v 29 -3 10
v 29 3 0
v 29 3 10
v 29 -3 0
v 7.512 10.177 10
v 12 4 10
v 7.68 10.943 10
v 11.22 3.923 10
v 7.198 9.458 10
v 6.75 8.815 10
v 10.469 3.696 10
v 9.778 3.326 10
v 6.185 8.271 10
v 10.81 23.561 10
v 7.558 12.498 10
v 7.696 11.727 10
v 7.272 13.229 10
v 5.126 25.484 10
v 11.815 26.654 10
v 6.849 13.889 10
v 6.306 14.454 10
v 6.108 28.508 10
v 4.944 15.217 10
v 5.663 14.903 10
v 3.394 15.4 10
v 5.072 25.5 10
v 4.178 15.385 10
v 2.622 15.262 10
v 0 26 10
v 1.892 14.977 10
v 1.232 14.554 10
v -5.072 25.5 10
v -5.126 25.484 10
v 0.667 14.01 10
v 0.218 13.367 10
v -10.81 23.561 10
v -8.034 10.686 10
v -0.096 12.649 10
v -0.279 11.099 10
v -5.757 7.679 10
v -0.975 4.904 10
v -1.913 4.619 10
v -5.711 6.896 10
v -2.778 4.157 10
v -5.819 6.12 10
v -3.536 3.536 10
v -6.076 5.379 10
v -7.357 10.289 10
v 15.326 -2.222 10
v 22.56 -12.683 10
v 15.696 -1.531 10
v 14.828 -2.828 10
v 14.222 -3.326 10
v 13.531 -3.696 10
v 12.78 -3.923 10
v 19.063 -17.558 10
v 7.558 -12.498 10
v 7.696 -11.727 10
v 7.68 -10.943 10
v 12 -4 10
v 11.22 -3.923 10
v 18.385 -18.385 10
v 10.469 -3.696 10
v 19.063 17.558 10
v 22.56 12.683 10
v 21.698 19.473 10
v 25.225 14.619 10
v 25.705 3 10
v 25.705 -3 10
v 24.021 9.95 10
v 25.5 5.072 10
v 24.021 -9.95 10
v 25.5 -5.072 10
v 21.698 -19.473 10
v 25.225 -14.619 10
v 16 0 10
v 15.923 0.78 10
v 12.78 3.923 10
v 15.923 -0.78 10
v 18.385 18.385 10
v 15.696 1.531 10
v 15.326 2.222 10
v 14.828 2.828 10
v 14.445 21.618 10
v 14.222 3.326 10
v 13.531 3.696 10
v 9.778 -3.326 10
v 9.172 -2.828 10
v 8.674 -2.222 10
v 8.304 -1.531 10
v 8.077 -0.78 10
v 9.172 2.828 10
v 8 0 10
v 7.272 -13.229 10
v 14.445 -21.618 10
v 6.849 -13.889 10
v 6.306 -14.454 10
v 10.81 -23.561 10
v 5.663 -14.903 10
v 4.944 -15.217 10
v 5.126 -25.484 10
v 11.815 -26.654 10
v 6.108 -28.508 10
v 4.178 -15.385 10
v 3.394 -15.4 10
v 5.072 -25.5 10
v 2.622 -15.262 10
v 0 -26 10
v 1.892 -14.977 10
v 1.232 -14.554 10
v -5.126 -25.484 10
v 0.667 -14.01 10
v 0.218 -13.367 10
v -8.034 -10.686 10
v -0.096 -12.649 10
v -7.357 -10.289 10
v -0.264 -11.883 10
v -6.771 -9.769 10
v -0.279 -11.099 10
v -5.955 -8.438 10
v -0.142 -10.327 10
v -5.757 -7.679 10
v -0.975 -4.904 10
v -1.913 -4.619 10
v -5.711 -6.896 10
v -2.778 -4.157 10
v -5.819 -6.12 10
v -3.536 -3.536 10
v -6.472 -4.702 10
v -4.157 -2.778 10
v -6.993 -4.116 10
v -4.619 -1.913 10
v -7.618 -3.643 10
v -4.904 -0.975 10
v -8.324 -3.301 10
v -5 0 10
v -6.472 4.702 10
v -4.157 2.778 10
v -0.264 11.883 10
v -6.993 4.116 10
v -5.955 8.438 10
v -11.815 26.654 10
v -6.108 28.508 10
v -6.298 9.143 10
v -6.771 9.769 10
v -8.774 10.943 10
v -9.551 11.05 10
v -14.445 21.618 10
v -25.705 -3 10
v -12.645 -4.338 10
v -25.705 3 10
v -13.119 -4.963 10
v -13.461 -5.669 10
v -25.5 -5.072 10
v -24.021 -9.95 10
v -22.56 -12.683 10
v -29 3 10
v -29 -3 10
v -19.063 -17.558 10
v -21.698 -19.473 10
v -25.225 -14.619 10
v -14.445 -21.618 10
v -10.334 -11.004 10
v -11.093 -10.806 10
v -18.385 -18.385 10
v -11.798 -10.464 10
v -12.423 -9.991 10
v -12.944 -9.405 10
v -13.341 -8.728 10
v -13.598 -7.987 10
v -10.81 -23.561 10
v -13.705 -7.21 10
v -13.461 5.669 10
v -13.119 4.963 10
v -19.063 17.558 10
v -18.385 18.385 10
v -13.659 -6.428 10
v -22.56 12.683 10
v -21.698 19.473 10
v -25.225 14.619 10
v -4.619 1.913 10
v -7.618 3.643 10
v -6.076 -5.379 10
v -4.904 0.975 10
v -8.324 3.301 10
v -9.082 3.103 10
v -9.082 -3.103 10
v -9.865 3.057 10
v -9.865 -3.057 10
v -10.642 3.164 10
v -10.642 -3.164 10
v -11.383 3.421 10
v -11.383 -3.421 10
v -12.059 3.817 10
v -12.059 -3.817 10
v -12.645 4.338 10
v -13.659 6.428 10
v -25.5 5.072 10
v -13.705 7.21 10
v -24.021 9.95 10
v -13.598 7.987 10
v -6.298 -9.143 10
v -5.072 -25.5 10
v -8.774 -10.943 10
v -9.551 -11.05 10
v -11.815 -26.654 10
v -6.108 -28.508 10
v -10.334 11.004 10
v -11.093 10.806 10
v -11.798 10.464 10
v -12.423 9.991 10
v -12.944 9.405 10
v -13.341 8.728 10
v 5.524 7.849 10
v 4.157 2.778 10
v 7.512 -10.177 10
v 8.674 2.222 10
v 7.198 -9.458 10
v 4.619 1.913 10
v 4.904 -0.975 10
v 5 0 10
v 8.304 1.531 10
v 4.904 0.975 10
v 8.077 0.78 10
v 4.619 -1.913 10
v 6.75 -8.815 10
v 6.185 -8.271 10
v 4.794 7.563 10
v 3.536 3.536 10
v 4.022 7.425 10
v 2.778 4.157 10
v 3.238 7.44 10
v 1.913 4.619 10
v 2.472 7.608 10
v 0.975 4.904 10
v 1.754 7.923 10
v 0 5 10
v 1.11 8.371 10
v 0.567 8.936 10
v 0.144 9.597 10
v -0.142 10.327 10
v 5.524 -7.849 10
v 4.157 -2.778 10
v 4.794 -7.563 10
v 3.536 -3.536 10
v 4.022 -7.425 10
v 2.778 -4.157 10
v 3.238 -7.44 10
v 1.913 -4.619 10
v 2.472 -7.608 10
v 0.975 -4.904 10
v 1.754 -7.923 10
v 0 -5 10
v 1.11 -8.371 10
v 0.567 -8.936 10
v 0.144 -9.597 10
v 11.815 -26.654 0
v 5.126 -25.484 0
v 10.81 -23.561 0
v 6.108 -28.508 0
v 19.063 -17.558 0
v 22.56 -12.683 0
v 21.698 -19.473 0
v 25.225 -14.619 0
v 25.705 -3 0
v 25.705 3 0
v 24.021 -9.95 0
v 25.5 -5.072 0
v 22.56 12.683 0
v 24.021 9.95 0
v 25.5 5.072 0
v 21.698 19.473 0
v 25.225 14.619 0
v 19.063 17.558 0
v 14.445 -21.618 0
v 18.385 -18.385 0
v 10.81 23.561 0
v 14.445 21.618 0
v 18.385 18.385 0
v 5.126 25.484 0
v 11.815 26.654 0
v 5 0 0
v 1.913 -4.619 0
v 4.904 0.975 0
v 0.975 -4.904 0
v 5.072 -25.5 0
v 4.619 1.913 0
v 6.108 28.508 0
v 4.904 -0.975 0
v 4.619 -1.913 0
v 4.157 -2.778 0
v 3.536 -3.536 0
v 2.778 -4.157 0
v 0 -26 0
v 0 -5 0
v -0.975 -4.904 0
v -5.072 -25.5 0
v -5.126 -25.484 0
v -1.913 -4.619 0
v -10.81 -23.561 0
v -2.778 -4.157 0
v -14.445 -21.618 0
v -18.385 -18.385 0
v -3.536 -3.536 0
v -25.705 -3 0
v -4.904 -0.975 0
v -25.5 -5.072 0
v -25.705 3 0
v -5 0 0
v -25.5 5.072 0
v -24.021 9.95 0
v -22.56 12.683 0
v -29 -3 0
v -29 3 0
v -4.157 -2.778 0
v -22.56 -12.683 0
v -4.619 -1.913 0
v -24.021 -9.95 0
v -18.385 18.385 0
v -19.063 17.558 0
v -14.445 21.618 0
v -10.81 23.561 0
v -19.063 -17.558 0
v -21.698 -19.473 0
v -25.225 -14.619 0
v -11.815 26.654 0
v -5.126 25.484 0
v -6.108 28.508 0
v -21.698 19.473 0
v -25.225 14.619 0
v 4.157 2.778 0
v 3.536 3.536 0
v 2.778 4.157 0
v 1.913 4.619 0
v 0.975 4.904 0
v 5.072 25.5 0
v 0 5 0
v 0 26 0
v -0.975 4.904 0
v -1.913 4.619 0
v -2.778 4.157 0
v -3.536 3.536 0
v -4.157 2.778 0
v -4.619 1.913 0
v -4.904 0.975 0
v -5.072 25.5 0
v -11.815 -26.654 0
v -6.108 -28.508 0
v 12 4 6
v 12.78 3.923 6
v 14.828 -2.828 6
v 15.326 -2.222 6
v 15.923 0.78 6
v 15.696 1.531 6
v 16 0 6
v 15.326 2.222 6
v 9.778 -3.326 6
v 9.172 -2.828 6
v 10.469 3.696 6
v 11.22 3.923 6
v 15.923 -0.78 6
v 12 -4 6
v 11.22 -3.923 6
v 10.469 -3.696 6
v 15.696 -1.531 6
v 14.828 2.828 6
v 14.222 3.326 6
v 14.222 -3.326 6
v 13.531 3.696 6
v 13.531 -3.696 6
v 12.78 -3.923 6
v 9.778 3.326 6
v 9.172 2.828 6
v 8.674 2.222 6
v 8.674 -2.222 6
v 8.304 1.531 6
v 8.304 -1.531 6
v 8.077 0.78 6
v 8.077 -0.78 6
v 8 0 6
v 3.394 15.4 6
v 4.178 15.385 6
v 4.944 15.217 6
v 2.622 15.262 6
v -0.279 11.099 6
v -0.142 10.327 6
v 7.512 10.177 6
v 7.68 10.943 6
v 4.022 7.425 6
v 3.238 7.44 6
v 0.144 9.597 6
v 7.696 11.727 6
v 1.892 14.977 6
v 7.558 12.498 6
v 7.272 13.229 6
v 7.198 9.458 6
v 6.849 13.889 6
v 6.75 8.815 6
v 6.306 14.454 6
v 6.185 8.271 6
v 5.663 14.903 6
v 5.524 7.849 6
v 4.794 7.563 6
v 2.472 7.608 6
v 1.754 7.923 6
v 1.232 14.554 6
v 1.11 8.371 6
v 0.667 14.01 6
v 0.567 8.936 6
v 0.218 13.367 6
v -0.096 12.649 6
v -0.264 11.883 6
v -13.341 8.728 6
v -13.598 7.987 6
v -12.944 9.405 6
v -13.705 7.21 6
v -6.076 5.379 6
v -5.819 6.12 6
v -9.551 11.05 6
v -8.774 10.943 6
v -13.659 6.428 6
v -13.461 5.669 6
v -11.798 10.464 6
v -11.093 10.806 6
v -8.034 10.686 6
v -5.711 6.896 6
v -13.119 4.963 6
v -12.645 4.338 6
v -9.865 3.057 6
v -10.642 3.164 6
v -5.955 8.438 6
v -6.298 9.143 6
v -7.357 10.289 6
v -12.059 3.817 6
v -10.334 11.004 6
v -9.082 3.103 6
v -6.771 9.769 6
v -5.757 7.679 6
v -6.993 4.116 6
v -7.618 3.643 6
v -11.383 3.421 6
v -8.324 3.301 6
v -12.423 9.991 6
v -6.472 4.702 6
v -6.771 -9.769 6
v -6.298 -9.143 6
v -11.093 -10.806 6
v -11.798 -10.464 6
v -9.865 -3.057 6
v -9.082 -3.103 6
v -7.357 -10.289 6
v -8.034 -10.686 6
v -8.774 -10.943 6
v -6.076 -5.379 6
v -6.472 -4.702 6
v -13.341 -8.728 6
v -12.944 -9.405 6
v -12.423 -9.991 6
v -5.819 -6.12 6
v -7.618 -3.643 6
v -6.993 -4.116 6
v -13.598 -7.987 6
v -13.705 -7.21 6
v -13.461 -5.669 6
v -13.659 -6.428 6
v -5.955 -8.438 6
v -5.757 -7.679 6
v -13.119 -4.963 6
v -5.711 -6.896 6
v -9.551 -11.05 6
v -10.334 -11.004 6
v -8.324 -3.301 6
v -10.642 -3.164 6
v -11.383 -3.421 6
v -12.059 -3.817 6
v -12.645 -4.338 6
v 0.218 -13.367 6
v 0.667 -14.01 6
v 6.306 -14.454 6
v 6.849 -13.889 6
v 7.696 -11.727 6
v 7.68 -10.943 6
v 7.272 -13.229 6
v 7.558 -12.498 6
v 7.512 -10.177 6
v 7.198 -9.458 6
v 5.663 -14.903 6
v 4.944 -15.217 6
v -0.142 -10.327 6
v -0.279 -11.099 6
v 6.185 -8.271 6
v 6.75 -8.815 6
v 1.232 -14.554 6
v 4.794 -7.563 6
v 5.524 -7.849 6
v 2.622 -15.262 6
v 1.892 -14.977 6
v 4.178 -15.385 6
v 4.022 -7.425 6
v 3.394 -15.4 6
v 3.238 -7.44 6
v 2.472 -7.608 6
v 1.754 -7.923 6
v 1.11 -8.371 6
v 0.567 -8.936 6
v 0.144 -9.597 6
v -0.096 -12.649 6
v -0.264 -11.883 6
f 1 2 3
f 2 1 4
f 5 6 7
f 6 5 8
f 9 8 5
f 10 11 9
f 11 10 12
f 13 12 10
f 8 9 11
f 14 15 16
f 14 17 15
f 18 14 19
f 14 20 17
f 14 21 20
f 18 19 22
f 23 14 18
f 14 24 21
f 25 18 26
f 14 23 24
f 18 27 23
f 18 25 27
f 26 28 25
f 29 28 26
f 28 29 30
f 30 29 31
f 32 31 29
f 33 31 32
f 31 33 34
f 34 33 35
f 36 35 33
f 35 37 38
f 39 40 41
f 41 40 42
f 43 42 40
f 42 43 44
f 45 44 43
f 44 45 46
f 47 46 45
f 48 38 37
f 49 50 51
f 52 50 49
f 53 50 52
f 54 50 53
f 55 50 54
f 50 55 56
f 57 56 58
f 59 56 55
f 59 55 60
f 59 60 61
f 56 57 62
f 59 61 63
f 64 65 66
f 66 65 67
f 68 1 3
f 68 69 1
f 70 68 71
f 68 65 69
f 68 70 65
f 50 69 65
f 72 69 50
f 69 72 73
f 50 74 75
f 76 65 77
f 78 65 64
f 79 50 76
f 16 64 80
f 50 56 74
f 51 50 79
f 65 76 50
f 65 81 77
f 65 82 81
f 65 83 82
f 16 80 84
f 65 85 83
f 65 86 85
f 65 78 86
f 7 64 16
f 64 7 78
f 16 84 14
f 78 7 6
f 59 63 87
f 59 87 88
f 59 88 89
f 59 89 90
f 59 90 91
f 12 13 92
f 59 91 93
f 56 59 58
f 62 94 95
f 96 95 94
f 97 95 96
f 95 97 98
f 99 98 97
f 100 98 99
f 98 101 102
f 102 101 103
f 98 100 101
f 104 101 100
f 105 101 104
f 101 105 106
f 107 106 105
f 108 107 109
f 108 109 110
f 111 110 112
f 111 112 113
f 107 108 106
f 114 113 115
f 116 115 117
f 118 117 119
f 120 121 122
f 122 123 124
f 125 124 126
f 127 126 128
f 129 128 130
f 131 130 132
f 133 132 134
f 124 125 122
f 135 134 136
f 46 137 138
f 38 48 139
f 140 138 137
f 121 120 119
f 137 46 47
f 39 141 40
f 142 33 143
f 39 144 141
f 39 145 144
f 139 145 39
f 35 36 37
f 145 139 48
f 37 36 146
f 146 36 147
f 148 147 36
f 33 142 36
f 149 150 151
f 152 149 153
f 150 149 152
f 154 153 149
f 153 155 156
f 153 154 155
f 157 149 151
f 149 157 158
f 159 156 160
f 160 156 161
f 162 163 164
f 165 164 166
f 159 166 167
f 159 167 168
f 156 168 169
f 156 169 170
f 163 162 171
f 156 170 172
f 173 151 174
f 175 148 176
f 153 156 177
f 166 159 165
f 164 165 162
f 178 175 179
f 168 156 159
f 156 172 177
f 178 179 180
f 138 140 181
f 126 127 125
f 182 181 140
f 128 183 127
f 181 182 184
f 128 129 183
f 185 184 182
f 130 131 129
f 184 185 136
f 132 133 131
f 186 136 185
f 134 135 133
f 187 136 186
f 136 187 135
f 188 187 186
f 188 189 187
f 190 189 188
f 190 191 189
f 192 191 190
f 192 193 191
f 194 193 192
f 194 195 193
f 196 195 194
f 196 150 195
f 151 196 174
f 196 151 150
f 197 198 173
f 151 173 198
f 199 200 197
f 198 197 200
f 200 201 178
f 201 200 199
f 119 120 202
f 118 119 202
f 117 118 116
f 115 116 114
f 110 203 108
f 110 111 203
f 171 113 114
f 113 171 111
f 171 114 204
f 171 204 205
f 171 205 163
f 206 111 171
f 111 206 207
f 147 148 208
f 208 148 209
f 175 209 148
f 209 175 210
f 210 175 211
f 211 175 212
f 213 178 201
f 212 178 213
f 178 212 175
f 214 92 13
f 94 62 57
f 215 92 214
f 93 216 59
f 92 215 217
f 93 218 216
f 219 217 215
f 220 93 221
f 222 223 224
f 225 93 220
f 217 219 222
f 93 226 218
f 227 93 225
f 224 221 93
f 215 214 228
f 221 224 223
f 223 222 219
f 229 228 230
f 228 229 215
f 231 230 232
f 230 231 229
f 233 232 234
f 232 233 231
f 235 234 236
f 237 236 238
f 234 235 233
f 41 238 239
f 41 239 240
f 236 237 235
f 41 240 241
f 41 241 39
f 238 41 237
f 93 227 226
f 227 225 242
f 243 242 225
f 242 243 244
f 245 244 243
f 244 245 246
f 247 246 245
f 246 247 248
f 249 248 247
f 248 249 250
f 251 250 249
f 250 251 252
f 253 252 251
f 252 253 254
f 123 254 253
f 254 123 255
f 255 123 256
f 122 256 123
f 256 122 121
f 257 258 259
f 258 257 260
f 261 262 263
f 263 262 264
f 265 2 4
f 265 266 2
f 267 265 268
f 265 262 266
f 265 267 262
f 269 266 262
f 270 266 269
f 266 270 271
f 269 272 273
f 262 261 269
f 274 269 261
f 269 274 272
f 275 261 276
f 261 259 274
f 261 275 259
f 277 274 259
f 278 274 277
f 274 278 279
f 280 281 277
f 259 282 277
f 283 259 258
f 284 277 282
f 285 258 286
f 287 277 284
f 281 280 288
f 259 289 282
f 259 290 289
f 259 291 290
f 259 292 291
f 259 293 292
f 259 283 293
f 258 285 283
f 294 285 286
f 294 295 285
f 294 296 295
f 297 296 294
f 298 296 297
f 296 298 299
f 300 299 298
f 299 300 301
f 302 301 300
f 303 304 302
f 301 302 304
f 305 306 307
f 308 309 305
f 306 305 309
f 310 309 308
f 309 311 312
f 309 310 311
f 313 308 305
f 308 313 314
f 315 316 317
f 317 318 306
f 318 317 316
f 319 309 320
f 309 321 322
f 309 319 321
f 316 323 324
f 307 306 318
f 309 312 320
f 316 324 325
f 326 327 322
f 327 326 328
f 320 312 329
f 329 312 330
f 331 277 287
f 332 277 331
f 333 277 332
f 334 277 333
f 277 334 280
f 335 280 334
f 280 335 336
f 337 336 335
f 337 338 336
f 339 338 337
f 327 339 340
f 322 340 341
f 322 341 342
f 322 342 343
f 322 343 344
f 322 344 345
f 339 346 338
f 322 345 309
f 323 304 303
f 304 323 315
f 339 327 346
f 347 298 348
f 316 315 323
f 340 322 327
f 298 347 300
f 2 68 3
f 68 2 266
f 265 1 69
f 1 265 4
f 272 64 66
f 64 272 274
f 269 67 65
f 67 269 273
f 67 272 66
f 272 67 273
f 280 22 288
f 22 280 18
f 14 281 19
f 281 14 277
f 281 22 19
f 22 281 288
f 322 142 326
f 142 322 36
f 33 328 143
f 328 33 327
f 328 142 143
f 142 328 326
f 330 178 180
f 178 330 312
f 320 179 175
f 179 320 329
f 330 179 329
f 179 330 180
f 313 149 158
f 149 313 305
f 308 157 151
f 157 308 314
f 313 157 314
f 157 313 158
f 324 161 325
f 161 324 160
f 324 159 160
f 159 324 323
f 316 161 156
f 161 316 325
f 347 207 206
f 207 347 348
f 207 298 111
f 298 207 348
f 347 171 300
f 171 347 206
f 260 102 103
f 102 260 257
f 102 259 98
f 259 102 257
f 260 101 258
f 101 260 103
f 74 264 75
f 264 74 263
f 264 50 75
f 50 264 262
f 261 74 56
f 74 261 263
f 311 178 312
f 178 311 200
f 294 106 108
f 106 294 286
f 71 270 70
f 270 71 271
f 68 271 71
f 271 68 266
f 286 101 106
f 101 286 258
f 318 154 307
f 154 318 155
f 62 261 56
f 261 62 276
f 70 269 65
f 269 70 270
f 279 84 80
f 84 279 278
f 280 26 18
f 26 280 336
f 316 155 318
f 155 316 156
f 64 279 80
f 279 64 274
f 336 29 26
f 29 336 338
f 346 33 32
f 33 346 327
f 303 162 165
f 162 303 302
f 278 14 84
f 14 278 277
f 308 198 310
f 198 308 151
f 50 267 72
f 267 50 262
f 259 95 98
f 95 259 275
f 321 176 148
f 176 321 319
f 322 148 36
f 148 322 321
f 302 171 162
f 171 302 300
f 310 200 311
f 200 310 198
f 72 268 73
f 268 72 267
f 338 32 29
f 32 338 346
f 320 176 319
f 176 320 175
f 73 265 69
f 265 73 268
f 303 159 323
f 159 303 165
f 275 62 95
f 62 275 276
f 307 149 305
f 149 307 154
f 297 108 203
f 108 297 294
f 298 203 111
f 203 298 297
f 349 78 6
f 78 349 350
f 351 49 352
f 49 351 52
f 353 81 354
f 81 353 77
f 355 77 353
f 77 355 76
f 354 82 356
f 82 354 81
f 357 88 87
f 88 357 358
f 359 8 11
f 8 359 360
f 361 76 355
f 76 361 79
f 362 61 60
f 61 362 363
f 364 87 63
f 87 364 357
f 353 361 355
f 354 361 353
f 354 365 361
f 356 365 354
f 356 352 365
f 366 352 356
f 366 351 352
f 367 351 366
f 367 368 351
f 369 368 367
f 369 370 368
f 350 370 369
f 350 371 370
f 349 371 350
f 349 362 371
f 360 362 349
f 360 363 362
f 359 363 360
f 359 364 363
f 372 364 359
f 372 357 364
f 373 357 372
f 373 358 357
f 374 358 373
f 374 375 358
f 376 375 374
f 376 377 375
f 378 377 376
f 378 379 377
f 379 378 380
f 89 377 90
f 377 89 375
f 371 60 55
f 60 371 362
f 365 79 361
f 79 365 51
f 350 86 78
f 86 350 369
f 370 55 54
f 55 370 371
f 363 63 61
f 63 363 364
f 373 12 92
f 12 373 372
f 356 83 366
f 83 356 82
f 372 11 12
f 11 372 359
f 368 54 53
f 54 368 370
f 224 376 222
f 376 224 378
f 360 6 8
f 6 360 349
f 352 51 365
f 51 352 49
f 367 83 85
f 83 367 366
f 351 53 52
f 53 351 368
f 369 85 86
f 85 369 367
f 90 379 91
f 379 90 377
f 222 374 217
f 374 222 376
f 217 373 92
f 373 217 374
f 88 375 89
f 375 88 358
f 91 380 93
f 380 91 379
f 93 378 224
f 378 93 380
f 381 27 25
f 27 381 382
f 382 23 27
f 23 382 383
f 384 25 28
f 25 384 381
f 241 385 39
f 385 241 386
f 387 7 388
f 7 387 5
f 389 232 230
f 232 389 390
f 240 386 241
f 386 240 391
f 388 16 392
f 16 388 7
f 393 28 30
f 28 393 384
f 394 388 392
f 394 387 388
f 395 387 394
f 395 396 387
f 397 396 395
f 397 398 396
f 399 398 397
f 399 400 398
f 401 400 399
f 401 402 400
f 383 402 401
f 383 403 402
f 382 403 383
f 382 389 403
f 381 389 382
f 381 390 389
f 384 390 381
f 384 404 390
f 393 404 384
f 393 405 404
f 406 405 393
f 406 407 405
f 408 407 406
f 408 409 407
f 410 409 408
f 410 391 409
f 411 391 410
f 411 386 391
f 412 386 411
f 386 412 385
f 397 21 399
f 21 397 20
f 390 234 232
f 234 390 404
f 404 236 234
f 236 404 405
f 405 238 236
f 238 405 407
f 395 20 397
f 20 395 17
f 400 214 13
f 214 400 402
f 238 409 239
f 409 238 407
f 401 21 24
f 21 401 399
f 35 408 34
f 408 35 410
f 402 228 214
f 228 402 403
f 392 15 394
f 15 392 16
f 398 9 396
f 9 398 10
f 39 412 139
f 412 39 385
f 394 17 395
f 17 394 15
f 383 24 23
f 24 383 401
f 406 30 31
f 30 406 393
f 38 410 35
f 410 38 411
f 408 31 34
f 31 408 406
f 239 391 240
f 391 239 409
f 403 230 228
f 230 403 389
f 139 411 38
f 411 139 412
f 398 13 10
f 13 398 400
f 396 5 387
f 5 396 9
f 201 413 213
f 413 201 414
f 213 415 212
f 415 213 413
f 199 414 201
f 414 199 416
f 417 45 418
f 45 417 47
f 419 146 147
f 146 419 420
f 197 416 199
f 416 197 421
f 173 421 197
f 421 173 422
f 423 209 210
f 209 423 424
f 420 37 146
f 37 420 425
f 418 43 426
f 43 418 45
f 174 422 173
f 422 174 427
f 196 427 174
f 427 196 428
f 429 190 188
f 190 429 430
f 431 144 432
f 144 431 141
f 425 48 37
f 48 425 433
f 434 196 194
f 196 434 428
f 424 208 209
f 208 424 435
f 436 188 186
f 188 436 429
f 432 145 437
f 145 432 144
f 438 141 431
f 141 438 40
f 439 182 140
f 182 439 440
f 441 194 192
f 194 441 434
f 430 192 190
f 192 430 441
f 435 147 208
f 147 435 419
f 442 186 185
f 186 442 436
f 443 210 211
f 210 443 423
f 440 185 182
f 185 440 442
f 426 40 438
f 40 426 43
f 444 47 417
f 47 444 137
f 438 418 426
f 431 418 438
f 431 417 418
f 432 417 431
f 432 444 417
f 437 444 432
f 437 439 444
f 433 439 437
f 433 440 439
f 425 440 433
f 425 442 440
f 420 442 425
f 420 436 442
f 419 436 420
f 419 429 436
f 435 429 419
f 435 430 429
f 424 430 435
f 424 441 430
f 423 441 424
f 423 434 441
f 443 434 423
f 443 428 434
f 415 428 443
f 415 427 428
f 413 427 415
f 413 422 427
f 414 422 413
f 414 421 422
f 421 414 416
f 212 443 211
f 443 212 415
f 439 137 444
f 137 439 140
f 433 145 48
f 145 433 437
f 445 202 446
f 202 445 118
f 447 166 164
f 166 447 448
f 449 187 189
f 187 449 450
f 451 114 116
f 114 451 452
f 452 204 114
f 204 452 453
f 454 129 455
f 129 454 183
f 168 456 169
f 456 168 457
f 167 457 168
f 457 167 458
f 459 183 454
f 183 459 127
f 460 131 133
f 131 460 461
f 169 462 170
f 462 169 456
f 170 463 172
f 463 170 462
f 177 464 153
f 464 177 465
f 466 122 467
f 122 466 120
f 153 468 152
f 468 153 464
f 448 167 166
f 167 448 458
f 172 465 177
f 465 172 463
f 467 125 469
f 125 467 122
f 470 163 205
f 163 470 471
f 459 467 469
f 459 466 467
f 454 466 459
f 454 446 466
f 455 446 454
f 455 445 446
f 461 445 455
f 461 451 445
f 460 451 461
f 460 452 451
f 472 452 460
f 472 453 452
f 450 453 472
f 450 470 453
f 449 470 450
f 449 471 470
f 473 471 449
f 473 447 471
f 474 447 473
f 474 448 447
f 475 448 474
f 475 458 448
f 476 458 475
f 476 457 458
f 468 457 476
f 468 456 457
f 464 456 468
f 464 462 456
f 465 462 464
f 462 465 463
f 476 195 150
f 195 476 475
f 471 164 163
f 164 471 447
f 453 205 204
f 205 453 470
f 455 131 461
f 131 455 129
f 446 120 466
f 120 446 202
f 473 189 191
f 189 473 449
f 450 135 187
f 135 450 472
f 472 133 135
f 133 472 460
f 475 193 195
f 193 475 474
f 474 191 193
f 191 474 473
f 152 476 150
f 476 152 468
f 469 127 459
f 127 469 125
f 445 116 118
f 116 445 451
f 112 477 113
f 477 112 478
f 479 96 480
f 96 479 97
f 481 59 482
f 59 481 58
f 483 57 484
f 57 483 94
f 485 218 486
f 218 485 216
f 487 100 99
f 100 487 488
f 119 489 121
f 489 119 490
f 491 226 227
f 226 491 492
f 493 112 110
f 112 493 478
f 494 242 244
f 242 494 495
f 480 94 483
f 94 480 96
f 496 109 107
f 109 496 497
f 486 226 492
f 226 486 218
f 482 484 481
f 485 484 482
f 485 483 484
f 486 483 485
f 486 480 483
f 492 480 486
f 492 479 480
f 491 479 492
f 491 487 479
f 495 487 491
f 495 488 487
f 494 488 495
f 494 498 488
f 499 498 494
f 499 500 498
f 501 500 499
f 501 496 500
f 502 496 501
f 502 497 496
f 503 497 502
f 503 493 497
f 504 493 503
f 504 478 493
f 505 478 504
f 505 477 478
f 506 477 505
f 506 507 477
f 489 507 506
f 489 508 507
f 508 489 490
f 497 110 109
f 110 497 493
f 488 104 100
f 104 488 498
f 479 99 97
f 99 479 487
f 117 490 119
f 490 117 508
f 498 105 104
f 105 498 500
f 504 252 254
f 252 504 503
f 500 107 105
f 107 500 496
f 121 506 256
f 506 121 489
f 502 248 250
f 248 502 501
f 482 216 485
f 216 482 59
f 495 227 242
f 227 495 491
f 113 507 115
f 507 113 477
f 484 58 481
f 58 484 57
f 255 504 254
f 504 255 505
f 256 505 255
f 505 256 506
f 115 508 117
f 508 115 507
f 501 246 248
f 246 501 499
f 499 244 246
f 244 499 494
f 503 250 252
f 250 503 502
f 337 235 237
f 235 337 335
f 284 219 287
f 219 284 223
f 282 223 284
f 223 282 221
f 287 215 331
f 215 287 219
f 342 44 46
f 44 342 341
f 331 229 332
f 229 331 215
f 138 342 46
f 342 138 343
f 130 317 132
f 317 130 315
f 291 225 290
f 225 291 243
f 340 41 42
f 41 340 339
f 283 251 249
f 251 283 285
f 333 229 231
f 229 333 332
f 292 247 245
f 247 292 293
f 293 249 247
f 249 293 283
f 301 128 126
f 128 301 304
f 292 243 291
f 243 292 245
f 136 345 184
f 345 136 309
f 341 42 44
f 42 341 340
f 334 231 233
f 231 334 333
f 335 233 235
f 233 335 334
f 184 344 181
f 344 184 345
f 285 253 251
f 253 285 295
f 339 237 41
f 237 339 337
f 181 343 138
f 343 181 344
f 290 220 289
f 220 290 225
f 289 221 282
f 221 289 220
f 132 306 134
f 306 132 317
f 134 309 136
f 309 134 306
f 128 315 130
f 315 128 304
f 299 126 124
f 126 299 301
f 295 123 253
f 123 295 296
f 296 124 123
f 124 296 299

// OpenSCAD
$fn = 32;

// ----------------------------------------------------------------------
// Spur blank: lightened gear blank
// ----------------------------------------------------------------------

// --- parameters (mm) ---
disc_r = 26;              // blank root radius
disc_t = 10;              // blank thickness
n_teeth = 10;             // stub tooth count
tooth_w = 6;              // tooth width at the root
tooth_h = 3;              // tooth height above the root
bore_r = 5;               // central bore radius
ring_r = 12;              // lightening pocket ring radius
pocket_r = 4;             // lightening pocket radius

out_r = disc_r + tooth_h;  // tip radius
bbox_x = 58.0;  // measured width over the teeth
bbox_y = 57.02;  // measured depth over the teeth

difference() {
union() {
  cylinder(r = disc_r, h = disc_t);
  for (i = [0 : n_teeth - 1])
    rotate([0, 0, i * 360 / n_teeth])
      translate([disc_r - 1, -tooth_w / 2, 0])
        cube([tooth_h + 1, tooth_w, disc_t]);
}
  translate([0, 0, -1]) cylinder(r = bore_r, h = disc_t + 2);
  for (i = [0 : 5])
    rotate([0, 0, i * 72])
      translate([ring_r, 0, disc_t - 4])
        cylinder(r = pocket_r, h = 5);
}
